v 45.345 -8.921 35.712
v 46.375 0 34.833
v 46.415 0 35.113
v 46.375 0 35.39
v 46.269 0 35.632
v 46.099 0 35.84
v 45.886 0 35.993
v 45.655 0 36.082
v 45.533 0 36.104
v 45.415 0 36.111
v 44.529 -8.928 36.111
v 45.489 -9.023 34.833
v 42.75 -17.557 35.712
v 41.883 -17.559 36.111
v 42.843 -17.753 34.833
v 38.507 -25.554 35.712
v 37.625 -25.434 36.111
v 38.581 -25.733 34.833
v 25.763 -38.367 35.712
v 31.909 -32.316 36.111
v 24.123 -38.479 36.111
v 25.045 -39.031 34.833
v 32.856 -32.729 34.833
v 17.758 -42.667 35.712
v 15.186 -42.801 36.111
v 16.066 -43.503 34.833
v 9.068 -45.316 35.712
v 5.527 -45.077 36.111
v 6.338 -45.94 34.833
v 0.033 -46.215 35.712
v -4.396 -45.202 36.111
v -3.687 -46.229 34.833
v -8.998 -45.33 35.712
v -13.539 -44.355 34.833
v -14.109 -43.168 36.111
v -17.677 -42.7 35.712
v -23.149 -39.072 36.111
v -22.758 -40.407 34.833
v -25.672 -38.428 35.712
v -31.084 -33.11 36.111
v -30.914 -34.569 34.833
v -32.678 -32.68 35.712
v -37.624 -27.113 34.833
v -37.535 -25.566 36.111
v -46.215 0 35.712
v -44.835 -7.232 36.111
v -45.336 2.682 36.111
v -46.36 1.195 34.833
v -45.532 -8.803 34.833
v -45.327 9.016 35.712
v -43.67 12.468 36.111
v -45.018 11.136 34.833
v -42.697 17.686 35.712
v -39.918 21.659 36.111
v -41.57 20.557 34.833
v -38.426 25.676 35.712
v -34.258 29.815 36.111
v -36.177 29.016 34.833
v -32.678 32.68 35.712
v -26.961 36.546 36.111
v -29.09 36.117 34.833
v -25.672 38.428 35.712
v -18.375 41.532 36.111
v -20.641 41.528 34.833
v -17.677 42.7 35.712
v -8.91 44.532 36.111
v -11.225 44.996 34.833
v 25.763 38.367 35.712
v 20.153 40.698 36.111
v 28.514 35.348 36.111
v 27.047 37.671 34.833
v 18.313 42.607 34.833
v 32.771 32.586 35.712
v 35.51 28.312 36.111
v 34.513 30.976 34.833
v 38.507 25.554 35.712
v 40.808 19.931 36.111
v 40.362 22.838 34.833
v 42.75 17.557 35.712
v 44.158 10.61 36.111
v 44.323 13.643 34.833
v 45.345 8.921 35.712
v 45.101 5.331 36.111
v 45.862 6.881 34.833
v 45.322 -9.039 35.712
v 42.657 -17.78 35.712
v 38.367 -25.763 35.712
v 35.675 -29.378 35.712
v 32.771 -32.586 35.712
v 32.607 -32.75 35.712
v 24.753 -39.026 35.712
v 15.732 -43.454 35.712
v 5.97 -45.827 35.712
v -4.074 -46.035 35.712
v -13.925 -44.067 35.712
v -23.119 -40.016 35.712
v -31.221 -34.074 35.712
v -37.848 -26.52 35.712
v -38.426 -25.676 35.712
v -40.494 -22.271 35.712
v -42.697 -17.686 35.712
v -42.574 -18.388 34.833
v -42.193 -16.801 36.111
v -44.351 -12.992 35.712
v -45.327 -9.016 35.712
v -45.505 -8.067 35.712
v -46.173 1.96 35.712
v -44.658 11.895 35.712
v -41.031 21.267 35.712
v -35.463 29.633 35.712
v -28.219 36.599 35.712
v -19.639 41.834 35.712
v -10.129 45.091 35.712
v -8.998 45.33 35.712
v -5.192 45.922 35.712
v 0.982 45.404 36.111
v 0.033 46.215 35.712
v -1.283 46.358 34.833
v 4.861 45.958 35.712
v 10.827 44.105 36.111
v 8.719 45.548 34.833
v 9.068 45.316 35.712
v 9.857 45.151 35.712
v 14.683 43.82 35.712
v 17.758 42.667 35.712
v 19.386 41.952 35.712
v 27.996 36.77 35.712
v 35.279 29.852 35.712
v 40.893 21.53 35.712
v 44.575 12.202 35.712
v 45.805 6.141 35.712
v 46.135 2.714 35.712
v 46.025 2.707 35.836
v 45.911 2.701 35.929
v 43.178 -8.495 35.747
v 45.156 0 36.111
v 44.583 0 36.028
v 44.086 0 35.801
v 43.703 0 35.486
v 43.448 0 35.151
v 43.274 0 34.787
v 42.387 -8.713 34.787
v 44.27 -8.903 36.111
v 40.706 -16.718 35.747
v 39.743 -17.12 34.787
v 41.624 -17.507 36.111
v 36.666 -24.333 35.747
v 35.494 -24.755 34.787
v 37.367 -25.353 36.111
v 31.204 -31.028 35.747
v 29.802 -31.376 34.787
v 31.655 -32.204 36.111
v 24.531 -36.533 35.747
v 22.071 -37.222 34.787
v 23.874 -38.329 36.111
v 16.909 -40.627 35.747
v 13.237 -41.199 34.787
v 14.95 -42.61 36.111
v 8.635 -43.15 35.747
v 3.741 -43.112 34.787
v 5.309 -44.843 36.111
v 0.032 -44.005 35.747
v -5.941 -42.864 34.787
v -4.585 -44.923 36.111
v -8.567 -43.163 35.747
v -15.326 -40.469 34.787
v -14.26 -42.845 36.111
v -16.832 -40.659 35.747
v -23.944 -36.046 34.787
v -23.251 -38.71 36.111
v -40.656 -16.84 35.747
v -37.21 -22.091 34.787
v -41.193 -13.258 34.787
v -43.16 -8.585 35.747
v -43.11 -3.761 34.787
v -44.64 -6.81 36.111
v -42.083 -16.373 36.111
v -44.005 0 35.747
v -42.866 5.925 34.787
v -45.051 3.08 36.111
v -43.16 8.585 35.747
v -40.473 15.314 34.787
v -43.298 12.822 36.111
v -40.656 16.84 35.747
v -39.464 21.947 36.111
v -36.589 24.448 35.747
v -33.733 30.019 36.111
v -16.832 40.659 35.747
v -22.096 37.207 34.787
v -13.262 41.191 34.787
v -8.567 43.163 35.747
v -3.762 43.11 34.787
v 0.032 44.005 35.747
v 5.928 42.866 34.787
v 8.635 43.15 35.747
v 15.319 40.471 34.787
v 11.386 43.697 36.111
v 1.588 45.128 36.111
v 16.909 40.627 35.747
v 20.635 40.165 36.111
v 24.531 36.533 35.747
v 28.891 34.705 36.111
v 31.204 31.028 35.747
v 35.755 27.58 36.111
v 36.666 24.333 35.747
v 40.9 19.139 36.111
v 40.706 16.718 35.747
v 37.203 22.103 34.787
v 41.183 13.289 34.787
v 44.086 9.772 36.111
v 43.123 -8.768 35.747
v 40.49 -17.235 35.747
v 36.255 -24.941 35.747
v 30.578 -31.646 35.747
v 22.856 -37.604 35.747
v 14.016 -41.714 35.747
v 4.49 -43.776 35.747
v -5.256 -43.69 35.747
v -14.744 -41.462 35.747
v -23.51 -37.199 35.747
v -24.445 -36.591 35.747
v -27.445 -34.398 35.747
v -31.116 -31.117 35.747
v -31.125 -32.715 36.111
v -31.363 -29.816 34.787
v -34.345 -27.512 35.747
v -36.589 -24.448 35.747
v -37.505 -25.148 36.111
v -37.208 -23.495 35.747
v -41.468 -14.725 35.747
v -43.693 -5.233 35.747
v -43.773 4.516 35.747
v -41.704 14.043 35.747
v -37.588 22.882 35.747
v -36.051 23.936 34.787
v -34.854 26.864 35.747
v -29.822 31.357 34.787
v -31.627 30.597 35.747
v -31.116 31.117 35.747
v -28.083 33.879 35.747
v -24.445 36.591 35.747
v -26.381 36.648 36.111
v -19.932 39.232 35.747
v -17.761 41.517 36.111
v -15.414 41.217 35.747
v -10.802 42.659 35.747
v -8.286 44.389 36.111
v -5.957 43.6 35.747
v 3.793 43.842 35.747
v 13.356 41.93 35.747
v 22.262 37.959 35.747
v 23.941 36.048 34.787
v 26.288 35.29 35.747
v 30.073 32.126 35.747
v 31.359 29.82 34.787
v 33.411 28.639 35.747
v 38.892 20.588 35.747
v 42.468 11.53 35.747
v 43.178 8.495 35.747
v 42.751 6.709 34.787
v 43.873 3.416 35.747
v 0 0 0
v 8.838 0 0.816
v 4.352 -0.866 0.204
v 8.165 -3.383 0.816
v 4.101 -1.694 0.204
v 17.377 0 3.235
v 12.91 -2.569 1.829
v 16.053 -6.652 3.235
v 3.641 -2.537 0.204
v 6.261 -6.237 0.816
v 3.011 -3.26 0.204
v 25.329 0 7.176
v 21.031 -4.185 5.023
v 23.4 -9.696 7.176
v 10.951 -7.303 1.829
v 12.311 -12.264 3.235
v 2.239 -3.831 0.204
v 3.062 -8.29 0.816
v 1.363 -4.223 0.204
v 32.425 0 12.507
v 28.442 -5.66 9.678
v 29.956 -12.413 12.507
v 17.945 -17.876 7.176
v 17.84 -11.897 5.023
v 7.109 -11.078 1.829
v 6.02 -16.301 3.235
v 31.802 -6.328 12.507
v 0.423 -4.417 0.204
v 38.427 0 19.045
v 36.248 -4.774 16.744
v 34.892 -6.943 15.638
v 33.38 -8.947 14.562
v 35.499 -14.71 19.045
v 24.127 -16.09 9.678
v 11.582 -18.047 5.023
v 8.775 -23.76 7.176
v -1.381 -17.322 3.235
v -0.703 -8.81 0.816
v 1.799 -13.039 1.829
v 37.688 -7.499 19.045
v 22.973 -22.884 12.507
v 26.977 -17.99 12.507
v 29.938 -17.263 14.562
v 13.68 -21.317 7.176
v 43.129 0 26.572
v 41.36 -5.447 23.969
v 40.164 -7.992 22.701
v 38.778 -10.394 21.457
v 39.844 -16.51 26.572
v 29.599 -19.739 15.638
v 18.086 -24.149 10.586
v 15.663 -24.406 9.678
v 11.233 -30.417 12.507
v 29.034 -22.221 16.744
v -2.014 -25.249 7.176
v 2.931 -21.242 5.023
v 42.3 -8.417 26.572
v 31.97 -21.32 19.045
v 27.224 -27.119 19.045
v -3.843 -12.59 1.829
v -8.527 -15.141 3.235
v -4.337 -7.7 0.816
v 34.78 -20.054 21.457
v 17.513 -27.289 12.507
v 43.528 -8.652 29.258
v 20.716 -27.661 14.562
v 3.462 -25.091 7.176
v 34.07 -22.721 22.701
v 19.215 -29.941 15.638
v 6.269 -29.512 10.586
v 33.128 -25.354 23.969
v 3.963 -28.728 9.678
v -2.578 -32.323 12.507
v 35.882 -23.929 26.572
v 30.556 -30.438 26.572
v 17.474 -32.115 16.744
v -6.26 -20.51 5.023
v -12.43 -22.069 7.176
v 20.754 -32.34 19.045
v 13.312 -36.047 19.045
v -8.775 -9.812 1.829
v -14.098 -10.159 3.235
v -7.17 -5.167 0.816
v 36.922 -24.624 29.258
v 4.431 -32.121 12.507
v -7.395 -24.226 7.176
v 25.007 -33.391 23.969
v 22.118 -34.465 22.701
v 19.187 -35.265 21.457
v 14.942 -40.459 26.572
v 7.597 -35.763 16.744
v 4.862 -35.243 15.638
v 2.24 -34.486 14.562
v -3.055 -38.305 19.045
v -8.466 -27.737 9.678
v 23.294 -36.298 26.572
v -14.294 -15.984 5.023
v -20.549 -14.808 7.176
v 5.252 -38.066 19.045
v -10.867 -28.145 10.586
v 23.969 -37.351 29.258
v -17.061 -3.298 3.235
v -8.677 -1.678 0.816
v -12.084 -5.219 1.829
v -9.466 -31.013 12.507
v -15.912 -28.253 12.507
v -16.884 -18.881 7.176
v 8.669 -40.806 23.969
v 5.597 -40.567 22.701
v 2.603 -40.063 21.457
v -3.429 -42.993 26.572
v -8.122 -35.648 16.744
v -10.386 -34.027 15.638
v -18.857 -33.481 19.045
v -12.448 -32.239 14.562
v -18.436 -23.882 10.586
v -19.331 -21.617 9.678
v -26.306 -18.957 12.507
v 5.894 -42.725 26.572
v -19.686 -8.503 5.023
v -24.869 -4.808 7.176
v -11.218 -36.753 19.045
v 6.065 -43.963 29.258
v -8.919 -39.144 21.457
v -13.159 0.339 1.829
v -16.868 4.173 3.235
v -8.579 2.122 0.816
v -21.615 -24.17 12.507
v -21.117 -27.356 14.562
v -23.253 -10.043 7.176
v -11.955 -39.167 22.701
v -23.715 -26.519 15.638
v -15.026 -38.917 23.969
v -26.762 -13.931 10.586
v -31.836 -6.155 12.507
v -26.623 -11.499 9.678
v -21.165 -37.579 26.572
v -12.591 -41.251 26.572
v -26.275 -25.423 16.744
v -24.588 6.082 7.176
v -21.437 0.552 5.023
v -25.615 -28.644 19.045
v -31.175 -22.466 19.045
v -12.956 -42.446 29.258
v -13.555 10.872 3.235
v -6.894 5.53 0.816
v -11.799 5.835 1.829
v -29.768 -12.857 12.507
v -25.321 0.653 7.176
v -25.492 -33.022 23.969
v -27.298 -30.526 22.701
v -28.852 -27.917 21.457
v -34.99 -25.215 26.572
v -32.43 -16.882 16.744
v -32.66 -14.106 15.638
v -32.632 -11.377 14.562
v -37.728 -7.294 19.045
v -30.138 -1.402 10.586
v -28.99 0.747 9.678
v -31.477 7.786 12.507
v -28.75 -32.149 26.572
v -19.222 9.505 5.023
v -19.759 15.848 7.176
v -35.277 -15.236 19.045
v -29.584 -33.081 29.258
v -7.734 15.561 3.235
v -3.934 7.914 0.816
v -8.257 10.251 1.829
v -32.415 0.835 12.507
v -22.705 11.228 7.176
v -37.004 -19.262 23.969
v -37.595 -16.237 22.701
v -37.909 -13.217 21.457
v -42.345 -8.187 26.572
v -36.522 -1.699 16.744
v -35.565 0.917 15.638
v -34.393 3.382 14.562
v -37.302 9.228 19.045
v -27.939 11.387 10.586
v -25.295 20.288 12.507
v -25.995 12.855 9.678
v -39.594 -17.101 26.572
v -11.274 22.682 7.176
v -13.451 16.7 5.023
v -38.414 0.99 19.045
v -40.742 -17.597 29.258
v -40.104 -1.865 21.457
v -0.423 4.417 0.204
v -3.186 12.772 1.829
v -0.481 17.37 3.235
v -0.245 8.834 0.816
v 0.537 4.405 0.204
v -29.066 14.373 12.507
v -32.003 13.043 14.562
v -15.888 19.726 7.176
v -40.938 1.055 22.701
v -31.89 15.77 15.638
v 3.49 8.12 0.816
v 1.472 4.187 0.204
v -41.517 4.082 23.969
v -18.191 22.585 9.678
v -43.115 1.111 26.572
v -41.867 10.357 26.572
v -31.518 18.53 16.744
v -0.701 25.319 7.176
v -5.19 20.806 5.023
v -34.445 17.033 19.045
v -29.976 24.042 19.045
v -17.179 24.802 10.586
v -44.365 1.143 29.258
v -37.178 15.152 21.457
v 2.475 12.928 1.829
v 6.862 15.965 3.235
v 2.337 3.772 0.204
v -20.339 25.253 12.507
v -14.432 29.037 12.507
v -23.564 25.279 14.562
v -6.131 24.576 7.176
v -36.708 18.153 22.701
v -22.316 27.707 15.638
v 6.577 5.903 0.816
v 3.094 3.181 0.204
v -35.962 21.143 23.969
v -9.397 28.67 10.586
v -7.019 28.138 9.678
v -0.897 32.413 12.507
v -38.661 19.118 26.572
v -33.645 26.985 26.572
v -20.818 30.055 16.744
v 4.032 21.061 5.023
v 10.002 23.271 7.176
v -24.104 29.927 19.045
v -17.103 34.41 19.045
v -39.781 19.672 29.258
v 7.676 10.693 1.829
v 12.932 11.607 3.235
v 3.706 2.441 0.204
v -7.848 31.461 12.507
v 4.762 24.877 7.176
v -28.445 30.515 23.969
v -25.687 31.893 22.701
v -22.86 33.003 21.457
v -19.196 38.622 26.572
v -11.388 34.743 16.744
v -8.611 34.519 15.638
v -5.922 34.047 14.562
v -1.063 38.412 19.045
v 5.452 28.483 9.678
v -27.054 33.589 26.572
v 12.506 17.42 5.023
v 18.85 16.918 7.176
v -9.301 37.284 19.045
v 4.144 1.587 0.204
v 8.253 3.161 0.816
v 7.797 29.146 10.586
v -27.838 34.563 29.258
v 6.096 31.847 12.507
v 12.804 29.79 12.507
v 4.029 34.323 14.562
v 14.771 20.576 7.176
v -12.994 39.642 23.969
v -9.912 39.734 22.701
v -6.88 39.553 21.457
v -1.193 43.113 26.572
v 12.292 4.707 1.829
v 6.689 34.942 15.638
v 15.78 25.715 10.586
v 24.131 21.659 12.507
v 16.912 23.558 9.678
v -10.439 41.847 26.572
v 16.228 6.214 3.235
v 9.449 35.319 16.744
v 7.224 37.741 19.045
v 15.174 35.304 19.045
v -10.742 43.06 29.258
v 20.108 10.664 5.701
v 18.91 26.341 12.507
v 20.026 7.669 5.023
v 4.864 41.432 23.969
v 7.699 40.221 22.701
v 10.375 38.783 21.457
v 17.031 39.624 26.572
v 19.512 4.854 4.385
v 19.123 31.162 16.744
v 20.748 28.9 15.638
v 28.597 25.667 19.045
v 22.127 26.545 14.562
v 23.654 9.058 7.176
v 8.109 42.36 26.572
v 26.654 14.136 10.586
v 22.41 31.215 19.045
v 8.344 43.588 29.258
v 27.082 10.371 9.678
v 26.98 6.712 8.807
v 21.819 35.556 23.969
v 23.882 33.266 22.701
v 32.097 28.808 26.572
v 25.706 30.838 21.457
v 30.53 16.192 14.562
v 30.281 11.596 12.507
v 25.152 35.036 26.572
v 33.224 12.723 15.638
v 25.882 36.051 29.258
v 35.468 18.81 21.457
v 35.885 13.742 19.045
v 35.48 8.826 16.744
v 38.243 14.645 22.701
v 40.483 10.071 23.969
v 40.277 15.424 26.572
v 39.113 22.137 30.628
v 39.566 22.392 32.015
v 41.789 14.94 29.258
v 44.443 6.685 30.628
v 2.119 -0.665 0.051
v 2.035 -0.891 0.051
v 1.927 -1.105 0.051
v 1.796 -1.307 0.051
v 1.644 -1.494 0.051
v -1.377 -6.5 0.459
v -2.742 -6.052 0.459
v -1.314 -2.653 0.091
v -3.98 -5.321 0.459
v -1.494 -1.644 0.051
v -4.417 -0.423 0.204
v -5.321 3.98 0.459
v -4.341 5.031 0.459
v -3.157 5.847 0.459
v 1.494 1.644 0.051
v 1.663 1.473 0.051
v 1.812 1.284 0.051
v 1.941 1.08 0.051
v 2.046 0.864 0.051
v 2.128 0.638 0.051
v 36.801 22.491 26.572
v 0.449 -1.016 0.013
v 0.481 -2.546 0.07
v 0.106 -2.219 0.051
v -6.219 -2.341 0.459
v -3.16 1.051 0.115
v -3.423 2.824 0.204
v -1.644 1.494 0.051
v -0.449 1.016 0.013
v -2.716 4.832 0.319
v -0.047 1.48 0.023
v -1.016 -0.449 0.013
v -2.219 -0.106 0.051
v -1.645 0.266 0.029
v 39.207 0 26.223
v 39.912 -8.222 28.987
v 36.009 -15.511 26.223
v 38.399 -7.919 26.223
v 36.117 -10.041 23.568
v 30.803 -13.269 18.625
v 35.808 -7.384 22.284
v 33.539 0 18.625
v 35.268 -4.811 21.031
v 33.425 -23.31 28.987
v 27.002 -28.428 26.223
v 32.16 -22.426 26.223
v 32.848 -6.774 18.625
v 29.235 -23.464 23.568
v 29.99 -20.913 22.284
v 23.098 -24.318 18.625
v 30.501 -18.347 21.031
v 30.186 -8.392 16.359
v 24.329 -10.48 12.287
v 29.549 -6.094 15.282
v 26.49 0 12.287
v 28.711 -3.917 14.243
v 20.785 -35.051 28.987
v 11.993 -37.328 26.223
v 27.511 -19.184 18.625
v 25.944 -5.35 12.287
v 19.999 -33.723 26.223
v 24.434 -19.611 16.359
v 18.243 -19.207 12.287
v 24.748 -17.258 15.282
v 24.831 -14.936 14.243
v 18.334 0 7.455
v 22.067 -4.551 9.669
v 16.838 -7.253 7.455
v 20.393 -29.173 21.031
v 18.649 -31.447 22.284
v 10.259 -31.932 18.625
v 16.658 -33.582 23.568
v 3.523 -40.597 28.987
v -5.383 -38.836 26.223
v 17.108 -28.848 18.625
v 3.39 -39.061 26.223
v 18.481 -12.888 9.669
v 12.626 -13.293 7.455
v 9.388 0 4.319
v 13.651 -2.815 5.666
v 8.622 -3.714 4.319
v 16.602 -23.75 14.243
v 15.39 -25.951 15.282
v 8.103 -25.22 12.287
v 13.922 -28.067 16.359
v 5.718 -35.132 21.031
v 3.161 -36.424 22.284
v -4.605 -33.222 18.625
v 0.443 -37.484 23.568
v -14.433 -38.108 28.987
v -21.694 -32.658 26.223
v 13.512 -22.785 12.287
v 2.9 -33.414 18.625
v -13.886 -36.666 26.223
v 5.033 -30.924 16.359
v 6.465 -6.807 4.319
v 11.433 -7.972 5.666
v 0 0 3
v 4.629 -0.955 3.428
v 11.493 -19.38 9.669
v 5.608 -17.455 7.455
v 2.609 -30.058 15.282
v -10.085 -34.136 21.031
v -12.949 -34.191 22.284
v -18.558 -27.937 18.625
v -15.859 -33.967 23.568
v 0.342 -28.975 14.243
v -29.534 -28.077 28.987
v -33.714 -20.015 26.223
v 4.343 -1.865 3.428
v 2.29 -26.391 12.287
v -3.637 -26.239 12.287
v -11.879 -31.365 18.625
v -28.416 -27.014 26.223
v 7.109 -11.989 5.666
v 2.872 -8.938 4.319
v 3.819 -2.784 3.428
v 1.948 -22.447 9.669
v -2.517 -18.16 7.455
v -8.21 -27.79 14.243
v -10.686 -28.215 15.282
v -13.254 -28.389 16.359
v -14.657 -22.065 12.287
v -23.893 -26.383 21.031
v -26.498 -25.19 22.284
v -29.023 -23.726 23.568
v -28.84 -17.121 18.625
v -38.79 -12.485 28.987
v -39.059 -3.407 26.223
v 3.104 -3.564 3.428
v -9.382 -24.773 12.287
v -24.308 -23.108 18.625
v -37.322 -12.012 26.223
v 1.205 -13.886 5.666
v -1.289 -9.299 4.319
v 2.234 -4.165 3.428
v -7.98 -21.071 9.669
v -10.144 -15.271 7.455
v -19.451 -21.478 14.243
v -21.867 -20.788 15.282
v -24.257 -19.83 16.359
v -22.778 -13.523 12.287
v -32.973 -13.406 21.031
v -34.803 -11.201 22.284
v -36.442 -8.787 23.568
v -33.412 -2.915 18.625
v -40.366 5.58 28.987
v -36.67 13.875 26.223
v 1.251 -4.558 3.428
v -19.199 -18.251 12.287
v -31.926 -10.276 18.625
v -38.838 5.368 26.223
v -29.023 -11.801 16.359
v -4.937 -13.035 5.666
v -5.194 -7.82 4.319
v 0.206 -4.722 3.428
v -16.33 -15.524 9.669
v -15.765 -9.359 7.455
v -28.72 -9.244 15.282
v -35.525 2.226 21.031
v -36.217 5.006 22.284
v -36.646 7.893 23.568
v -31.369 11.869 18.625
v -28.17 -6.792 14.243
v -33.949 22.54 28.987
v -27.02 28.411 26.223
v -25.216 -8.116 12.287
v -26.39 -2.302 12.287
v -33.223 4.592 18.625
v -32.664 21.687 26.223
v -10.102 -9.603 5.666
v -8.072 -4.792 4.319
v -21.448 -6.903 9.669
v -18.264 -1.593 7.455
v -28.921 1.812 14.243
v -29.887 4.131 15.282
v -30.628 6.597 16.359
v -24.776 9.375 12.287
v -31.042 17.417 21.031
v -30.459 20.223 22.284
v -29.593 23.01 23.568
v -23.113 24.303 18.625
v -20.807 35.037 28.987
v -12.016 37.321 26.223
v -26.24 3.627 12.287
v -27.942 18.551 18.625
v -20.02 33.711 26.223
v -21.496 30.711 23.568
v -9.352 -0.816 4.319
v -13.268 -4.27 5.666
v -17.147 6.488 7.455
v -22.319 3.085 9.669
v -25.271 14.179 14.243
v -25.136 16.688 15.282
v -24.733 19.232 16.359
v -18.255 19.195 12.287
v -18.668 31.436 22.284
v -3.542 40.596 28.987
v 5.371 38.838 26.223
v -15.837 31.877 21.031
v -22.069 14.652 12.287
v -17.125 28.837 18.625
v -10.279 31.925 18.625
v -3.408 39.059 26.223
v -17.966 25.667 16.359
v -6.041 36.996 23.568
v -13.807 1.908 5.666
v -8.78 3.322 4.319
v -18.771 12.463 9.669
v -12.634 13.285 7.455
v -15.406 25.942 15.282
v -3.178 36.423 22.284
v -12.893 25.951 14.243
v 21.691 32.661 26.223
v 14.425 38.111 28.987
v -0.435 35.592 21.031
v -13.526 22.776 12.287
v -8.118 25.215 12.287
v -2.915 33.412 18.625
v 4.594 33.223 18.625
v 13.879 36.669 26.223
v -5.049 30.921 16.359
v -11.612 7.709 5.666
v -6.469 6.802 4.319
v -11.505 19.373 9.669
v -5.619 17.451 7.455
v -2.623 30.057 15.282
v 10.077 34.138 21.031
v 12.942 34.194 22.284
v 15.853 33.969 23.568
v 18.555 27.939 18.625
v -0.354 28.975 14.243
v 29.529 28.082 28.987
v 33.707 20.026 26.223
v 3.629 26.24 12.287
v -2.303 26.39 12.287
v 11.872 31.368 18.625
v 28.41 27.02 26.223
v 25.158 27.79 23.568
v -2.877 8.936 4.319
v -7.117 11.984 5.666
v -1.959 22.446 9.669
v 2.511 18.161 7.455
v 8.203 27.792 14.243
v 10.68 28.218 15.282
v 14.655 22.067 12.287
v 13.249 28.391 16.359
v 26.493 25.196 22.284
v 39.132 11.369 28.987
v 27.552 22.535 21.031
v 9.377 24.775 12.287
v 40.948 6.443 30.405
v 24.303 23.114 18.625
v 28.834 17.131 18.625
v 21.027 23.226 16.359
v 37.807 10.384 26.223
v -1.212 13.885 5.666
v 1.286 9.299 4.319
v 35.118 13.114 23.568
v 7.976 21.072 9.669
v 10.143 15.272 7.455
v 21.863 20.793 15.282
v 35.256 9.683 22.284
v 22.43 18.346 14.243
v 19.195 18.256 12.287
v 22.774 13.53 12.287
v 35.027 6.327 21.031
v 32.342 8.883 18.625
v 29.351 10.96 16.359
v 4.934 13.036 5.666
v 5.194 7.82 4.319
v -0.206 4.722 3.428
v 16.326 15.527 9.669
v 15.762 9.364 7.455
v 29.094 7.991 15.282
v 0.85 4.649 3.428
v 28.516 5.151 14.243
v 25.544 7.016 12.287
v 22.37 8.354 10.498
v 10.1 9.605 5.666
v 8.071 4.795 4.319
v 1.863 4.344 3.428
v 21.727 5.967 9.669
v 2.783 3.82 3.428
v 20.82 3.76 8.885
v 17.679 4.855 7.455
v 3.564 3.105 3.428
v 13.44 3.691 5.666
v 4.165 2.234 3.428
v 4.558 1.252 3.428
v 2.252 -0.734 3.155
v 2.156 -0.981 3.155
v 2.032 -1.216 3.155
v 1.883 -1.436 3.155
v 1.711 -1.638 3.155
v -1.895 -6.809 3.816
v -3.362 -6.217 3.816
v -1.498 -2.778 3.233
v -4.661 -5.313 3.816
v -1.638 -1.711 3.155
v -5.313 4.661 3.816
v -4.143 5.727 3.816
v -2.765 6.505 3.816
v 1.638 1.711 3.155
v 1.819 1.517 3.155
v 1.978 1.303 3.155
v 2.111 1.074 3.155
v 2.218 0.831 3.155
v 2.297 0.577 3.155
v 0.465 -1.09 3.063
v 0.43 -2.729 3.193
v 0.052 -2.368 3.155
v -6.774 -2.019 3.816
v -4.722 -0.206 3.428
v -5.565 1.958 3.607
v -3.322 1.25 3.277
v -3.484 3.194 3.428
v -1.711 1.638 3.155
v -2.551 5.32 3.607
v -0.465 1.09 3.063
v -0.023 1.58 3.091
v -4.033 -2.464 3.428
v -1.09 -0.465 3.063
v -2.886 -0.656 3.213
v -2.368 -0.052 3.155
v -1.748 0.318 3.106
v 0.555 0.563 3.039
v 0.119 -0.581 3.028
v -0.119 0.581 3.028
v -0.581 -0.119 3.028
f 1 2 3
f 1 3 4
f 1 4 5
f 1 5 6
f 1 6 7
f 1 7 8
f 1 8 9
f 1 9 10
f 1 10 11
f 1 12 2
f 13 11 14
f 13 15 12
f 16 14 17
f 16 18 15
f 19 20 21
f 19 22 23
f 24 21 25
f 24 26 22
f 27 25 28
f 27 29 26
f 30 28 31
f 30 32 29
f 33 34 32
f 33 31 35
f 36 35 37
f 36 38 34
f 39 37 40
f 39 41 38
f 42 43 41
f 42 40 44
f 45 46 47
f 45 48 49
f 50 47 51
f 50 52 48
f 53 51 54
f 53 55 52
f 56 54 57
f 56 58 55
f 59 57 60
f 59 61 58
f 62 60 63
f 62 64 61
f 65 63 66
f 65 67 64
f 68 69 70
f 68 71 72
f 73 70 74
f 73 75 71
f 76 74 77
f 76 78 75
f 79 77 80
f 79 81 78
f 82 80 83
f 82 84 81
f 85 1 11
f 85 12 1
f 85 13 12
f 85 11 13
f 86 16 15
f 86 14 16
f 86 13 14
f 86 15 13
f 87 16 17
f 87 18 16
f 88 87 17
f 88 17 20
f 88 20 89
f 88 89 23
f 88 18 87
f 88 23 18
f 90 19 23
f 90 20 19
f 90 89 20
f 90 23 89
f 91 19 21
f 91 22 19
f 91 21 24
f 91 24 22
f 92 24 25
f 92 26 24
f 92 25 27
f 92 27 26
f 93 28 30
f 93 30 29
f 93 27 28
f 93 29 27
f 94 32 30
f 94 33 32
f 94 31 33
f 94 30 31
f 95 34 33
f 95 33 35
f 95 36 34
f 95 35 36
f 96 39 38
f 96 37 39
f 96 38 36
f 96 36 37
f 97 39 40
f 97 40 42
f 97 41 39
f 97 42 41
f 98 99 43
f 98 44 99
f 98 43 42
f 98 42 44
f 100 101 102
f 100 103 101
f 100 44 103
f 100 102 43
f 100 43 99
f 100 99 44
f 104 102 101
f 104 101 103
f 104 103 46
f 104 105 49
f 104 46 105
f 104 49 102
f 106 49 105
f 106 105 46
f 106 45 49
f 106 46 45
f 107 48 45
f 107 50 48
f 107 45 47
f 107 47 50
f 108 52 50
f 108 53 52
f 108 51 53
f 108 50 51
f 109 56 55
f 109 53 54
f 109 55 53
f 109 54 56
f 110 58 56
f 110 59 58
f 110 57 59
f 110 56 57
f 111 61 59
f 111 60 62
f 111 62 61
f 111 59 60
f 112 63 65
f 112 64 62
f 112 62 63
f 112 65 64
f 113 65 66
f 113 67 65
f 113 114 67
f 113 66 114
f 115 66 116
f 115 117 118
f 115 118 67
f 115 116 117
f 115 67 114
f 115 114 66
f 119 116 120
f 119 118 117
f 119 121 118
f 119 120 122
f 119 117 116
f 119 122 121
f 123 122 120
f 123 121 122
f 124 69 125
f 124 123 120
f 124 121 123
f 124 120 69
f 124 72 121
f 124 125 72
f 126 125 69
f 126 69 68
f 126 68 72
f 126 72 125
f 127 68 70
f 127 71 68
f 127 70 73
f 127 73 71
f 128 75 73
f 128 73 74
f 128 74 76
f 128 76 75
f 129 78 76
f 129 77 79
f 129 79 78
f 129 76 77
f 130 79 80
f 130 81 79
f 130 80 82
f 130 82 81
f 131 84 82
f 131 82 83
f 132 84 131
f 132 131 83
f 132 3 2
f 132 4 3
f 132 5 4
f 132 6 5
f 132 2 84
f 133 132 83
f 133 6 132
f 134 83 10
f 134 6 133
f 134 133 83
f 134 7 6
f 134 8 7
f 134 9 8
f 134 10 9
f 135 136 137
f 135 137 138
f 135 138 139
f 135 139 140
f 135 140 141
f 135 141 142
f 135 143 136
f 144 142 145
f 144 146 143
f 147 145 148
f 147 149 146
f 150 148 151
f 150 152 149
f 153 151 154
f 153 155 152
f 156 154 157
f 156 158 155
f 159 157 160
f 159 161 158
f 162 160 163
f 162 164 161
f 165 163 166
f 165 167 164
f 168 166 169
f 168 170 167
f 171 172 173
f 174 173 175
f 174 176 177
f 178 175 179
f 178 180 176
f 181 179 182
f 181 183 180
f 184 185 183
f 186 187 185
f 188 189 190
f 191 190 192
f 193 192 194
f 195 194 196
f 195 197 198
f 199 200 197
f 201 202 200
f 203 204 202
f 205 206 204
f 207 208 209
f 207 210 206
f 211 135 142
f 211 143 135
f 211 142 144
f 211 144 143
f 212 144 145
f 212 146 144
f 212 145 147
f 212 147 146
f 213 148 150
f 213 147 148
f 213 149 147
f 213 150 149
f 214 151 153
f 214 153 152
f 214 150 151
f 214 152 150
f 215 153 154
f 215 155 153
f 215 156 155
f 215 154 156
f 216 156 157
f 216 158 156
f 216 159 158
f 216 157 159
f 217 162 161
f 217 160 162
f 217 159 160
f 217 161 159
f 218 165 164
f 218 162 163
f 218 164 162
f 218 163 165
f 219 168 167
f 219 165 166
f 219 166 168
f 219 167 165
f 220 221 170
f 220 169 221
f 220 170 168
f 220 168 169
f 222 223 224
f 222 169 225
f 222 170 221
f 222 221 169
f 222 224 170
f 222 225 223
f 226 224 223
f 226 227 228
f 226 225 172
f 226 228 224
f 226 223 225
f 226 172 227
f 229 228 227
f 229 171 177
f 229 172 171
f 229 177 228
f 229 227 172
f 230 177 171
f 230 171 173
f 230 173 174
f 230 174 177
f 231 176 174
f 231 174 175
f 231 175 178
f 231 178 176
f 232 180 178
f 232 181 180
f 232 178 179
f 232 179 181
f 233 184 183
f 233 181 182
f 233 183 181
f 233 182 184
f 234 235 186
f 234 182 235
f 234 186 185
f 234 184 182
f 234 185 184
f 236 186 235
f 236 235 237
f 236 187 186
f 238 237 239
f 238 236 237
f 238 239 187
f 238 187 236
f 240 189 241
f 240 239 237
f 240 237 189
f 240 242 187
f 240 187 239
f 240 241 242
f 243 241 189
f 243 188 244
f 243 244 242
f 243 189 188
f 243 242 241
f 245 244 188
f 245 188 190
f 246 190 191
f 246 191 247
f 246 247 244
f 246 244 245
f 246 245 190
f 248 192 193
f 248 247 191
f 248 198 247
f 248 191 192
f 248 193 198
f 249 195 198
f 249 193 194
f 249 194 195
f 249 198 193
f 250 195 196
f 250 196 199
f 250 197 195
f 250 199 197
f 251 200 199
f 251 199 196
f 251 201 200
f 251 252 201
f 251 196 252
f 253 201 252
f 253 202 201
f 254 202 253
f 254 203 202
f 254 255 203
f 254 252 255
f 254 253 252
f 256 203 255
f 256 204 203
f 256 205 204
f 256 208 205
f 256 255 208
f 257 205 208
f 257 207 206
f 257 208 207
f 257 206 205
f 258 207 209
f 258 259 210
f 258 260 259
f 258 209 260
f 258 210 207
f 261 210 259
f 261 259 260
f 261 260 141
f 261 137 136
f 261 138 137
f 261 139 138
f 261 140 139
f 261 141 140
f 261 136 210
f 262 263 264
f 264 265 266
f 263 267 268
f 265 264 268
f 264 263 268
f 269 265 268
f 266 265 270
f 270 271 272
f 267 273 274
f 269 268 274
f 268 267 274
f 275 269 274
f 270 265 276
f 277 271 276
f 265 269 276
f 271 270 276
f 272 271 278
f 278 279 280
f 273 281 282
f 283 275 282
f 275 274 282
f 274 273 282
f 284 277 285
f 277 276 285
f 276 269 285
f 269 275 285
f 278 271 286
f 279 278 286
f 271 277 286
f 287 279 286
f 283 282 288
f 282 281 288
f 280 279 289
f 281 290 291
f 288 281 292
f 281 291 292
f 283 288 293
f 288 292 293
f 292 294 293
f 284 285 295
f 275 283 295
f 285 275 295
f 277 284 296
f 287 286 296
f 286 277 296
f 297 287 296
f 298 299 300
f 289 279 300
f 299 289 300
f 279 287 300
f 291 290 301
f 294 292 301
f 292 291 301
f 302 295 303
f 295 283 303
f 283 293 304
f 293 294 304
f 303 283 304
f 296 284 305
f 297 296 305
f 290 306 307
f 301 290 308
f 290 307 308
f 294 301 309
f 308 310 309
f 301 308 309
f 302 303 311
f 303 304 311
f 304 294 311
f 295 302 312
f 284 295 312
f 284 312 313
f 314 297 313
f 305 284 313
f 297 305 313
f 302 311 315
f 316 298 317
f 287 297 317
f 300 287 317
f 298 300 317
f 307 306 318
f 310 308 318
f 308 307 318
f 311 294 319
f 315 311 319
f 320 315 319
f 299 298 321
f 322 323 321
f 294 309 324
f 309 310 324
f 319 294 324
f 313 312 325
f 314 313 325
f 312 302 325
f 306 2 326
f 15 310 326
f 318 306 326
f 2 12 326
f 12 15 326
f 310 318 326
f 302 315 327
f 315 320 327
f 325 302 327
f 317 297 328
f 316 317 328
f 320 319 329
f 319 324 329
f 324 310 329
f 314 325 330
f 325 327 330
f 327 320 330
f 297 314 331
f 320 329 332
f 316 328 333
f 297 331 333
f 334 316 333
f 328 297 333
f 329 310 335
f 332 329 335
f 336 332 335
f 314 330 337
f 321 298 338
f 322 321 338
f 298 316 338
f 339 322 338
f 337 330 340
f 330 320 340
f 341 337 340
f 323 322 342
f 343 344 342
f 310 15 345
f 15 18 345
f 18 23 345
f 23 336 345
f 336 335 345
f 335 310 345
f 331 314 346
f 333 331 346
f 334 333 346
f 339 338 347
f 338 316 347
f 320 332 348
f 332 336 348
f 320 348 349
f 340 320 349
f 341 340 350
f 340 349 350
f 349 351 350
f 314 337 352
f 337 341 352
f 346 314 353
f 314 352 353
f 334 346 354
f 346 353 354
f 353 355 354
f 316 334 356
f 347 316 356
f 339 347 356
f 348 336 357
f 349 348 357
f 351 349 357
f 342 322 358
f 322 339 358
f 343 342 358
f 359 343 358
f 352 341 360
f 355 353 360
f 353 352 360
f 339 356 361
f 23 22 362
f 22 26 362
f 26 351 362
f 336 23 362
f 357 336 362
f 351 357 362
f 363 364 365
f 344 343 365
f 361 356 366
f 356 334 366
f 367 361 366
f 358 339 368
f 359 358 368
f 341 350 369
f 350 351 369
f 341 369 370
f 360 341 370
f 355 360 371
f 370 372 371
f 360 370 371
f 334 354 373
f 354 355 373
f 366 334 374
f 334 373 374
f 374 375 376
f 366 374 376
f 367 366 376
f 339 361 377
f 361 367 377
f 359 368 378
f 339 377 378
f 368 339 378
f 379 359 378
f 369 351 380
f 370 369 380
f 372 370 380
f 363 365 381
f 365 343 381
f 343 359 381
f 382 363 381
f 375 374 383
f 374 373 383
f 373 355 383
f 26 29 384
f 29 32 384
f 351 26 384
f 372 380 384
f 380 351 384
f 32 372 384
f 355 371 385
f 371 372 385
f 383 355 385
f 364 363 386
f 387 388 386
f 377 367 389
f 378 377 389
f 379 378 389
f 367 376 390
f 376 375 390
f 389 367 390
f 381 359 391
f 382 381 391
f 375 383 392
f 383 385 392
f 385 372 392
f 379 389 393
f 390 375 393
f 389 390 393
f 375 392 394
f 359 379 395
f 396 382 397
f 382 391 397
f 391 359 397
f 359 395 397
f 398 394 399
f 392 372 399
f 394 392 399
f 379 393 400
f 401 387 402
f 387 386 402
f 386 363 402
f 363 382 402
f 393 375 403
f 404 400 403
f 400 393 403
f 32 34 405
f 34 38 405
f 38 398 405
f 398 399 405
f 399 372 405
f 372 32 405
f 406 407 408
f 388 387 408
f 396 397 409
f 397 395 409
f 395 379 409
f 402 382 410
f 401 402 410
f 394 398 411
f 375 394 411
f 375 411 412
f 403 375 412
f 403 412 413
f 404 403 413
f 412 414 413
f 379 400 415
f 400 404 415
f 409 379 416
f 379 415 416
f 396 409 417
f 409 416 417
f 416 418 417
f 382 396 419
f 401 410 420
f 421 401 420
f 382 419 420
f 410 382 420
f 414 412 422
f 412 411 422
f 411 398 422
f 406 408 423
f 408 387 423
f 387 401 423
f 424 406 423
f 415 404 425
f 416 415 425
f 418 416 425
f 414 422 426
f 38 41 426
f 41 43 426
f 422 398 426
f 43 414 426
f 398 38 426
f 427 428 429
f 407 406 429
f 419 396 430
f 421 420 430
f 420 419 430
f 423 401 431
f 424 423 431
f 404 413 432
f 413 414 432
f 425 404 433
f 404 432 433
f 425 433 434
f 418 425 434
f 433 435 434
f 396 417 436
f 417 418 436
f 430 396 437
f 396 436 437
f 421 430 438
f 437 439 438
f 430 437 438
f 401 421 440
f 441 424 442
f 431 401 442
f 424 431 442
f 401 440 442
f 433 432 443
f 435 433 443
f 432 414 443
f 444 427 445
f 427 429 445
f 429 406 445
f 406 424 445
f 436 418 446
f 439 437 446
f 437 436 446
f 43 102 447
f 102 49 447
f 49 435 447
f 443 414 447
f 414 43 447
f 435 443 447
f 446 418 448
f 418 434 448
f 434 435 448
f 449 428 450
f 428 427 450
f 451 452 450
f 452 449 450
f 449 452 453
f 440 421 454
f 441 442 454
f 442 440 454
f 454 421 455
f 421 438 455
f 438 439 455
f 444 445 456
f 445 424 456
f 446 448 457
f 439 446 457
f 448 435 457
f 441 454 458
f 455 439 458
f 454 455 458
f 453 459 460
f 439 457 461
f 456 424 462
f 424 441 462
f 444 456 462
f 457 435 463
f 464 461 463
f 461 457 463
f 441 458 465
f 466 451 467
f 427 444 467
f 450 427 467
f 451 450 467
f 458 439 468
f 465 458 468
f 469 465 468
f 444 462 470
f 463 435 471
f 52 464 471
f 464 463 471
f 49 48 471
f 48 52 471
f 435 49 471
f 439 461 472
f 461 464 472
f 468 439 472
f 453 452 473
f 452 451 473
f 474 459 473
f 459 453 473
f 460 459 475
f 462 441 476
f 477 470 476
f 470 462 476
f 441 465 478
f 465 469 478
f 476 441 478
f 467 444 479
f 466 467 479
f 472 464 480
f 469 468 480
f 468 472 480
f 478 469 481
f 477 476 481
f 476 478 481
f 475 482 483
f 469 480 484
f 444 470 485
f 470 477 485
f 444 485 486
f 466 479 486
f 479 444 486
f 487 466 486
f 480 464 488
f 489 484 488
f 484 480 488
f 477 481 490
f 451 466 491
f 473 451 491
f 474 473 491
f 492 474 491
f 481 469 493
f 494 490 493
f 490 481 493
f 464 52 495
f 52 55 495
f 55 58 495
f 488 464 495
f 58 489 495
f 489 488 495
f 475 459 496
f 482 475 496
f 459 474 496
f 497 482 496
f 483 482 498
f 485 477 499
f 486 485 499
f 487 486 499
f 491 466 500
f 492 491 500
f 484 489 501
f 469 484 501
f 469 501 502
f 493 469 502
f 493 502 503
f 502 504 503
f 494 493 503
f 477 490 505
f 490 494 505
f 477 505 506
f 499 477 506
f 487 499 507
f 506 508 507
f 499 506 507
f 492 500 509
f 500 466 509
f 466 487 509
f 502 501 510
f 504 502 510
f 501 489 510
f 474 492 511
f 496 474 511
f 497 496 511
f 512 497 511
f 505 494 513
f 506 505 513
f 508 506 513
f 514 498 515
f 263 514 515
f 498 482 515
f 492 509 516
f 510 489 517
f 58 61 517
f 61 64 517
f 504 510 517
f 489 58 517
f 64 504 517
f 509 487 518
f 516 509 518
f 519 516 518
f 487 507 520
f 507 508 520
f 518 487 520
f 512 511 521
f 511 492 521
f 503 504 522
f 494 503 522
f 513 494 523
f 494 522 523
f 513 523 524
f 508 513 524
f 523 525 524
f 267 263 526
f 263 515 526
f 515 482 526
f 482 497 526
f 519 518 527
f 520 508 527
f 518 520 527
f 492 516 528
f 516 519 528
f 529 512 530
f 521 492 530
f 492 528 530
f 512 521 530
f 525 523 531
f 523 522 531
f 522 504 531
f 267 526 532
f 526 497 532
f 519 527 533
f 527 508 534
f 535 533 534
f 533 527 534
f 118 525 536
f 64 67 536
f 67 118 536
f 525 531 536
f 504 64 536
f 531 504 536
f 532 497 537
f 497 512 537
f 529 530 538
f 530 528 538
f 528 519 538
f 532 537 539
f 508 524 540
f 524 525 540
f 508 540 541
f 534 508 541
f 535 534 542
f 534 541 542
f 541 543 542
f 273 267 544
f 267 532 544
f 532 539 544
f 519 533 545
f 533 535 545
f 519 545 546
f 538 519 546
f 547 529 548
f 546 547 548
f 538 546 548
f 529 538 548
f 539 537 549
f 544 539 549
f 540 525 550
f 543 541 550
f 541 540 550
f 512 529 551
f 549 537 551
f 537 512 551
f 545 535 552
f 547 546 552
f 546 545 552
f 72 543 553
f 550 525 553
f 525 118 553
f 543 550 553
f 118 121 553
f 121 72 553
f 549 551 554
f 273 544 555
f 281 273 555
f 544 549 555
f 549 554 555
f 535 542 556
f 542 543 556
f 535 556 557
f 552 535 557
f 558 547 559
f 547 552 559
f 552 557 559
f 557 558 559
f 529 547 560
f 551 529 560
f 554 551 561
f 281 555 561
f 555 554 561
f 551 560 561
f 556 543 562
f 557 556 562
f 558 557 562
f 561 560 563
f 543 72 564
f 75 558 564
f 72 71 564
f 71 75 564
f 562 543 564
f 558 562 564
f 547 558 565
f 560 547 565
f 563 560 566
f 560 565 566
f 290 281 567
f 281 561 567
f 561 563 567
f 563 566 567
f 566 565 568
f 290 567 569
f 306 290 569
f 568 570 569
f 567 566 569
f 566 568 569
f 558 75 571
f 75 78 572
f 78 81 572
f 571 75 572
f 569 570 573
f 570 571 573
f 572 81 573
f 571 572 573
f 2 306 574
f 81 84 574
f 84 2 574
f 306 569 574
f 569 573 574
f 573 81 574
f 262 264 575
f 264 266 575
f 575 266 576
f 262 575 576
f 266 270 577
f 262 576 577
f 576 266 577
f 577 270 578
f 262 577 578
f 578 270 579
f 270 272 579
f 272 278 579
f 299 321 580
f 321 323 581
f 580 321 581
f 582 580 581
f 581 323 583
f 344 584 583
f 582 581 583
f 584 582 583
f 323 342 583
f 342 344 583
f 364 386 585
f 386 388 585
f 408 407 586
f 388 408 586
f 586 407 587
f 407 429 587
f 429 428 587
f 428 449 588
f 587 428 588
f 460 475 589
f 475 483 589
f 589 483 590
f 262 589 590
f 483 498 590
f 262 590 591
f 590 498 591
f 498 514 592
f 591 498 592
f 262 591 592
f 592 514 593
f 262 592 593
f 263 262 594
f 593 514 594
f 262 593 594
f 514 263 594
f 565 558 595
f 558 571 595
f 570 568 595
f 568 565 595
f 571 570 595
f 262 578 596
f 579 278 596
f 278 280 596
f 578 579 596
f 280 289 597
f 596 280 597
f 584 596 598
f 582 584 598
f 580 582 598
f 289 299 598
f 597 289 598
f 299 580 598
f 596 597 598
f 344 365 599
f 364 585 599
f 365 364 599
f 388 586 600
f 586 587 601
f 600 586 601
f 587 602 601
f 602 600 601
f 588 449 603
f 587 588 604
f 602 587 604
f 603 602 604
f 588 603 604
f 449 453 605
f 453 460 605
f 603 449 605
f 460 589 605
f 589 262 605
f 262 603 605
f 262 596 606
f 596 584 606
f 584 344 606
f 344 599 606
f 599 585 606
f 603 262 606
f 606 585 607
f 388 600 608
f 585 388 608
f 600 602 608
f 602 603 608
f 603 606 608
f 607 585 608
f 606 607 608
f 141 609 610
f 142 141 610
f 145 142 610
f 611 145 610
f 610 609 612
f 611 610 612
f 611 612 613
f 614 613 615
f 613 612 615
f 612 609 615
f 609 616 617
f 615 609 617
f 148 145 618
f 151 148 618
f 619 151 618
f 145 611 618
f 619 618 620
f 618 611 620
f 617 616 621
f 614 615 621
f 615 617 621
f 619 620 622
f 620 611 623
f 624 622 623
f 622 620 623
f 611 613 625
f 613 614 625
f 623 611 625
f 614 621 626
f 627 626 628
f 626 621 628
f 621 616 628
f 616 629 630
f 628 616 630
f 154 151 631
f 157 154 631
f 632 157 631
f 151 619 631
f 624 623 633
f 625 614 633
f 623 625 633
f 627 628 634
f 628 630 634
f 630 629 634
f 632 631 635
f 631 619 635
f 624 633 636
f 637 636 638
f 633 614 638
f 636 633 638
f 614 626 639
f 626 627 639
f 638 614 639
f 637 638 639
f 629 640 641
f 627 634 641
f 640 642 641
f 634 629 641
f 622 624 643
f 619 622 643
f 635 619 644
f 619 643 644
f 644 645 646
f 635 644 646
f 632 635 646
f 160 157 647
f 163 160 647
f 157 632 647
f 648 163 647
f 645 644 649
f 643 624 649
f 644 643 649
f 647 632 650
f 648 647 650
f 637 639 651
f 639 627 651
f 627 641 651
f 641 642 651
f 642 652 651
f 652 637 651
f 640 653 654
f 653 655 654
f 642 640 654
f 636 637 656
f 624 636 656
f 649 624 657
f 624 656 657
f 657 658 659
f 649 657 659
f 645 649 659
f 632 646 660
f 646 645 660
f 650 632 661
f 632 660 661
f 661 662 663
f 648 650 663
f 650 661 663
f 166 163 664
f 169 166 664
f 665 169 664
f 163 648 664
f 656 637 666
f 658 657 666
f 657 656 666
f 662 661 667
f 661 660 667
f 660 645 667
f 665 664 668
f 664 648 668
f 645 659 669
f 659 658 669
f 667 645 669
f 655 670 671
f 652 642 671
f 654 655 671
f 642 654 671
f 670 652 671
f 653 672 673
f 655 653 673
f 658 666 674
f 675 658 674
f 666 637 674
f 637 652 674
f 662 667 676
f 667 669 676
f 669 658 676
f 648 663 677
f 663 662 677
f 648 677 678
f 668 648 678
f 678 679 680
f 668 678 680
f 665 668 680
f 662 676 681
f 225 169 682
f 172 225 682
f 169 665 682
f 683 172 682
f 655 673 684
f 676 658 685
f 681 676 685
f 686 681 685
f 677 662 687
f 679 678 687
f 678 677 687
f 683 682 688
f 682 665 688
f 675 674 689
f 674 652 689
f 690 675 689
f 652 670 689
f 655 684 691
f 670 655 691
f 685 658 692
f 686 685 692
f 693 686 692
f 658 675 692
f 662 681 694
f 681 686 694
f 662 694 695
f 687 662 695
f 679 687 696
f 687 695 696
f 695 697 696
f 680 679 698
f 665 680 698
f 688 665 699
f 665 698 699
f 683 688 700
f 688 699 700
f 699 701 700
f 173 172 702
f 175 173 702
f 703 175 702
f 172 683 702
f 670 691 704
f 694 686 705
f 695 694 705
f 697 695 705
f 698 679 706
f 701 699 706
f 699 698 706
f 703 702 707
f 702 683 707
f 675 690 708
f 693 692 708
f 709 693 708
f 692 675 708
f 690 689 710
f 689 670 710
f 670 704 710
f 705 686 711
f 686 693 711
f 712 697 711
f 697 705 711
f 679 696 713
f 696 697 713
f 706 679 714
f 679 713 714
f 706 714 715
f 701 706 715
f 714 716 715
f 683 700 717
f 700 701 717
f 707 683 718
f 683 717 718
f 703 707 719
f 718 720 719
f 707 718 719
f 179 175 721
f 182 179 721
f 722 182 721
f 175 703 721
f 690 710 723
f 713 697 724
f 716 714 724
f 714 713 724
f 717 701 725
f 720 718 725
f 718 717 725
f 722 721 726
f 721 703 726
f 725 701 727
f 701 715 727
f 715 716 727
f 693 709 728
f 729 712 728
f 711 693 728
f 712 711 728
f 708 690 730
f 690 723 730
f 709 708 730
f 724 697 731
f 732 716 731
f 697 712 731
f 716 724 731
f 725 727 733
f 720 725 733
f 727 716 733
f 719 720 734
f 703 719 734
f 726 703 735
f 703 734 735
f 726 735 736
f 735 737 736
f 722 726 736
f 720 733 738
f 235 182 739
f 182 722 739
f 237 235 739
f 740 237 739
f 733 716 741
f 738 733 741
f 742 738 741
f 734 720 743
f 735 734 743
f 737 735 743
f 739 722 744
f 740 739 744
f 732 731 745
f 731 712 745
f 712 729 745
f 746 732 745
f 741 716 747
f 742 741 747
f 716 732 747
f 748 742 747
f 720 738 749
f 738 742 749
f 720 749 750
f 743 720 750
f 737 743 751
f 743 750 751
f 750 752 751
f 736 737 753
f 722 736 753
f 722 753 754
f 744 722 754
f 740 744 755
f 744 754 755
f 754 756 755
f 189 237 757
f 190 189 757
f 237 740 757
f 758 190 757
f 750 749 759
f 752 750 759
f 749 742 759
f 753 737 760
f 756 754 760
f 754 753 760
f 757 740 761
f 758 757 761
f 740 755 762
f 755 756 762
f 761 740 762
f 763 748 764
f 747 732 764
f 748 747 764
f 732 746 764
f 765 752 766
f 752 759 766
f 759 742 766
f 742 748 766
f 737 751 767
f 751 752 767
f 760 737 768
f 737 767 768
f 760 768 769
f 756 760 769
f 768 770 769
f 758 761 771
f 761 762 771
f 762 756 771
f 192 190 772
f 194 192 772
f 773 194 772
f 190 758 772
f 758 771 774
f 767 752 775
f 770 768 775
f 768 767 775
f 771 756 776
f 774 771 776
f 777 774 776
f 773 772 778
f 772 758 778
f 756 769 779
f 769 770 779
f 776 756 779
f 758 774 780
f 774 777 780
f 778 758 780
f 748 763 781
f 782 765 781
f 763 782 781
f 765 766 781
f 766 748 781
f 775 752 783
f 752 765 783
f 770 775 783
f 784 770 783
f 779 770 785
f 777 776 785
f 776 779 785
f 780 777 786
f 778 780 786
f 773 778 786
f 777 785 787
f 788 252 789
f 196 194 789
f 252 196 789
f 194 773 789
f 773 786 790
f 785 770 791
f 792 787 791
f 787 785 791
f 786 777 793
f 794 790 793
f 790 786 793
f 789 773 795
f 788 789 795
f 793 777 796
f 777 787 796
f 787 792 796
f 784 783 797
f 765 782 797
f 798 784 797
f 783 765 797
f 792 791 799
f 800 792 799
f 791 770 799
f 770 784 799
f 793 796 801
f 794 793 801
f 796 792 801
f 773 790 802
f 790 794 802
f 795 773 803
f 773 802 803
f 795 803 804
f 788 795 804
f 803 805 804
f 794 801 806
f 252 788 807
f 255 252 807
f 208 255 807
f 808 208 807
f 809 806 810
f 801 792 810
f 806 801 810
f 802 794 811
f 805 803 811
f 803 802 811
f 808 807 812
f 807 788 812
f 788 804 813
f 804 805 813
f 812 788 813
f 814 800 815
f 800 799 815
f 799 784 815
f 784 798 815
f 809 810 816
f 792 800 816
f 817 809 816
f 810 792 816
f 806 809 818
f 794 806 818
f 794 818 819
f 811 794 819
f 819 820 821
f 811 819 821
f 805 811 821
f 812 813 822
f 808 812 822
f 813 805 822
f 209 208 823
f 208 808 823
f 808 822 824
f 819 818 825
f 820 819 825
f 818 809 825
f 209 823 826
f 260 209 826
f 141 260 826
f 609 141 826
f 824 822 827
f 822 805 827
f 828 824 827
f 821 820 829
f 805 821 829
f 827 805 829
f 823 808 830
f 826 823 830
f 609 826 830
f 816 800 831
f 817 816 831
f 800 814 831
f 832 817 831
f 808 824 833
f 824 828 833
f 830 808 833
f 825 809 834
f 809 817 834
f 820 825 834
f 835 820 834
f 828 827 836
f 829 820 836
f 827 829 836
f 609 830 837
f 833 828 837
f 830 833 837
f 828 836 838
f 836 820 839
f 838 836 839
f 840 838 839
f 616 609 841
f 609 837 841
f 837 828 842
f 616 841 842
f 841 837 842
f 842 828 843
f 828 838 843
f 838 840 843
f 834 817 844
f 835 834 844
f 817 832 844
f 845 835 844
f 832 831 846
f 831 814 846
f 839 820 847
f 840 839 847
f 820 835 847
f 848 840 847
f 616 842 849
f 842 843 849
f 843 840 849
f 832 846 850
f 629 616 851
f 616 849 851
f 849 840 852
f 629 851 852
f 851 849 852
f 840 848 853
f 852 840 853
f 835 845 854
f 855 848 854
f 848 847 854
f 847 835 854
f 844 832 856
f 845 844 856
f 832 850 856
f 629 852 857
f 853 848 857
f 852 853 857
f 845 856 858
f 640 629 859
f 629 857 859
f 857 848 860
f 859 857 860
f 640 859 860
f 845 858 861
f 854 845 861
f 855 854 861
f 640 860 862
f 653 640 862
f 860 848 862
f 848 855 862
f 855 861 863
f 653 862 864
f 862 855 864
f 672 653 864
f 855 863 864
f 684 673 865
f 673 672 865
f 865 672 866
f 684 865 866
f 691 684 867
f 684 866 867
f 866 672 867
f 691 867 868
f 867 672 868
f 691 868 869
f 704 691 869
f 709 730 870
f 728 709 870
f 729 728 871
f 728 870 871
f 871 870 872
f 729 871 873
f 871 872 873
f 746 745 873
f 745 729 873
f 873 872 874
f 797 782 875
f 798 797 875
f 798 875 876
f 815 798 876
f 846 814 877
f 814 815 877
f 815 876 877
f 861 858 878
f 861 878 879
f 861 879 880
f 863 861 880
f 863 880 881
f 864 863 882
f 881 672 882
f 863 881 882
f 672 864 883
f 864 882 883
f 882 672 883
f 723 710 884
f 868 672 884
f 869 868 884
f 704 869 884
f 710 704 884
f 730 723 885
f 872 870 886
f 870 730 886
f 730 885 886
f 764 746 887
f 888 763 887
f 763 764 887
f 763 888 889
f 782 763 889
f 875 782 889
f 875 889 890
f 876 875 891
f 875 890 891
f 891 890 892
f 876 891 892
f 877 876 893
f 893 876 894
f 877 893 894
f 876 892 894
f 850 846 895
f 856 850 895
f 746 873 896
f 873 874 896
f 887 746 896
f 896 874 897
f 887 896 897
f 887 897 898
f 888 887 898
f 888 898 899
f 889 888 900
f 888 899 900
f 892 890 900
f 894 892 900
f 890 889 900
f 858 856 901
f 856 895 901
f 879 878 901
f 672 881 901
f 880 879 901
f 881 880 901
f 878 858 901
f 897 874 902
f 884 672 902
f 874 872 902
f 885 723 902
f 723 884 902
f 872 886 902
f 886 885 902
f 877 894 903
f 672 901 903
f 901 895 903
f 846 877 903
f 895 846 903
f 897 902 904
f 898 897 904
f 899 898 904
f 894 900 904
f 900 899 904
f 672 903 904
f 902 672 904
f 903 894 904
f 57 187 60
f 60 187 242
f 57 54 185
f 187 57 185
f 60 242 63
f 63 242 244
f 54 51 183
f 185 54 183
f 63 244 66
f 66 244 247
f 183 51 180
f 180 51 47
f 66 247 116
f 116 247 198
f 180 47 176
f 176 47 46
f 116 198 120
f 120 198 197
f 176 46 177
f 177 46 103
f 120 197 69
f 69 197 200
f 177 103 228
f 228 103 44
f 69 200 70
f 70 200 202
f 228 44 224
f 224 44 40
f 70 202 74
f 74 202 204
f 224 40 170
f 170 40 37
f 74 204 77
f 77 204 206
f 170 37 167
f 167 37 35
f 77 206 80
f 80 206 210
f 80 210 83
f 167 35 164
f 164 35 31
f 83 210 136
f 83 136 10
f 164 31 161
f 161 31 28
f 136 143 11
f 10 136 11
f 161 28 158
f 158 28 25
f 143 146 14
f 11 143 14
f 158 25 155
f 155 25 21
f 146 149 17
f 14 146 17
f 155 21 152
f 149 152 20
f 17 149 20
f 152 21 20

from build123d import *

# Parameters (mm, degrees)
F2_R = 1
F3_R = 2


with BuildPart() as f1:
    # F0 (on Front) → F1 (revolve)
    with BuildSketch(Plane.XZ):
        with BuildLine():
            Line((0, 3), (0, 0))
            ThreePointArc((0, 0), (29.527422, 10.079913), (46.727345, 36.111355))
            Line((46.727345, 36.111355), (43.727345, 36.111355))
            ThreePointArc((43.727345, 36.111355), (27.051049, 12.705151), (0, 3))
        make_face()
    revolve(axis=Axis((0, 0, 1.5), (0, 0, -1)))

    # F2
    f2_edges = [f1.edges().sort_by_distance(p)[0] for p in [
        (-46.727345, 0, 36.111355),
    ]]
    fillet(f2_edges, radius=F2_R)

    # F3
    f3_edges = [f1.edges().sort_by_distance(p)[0] for p in [
        (-43.727345, 0, 36.111355),
    ]]
    fillet(f3_edges, radius=F3_R)


solid = f1.part
